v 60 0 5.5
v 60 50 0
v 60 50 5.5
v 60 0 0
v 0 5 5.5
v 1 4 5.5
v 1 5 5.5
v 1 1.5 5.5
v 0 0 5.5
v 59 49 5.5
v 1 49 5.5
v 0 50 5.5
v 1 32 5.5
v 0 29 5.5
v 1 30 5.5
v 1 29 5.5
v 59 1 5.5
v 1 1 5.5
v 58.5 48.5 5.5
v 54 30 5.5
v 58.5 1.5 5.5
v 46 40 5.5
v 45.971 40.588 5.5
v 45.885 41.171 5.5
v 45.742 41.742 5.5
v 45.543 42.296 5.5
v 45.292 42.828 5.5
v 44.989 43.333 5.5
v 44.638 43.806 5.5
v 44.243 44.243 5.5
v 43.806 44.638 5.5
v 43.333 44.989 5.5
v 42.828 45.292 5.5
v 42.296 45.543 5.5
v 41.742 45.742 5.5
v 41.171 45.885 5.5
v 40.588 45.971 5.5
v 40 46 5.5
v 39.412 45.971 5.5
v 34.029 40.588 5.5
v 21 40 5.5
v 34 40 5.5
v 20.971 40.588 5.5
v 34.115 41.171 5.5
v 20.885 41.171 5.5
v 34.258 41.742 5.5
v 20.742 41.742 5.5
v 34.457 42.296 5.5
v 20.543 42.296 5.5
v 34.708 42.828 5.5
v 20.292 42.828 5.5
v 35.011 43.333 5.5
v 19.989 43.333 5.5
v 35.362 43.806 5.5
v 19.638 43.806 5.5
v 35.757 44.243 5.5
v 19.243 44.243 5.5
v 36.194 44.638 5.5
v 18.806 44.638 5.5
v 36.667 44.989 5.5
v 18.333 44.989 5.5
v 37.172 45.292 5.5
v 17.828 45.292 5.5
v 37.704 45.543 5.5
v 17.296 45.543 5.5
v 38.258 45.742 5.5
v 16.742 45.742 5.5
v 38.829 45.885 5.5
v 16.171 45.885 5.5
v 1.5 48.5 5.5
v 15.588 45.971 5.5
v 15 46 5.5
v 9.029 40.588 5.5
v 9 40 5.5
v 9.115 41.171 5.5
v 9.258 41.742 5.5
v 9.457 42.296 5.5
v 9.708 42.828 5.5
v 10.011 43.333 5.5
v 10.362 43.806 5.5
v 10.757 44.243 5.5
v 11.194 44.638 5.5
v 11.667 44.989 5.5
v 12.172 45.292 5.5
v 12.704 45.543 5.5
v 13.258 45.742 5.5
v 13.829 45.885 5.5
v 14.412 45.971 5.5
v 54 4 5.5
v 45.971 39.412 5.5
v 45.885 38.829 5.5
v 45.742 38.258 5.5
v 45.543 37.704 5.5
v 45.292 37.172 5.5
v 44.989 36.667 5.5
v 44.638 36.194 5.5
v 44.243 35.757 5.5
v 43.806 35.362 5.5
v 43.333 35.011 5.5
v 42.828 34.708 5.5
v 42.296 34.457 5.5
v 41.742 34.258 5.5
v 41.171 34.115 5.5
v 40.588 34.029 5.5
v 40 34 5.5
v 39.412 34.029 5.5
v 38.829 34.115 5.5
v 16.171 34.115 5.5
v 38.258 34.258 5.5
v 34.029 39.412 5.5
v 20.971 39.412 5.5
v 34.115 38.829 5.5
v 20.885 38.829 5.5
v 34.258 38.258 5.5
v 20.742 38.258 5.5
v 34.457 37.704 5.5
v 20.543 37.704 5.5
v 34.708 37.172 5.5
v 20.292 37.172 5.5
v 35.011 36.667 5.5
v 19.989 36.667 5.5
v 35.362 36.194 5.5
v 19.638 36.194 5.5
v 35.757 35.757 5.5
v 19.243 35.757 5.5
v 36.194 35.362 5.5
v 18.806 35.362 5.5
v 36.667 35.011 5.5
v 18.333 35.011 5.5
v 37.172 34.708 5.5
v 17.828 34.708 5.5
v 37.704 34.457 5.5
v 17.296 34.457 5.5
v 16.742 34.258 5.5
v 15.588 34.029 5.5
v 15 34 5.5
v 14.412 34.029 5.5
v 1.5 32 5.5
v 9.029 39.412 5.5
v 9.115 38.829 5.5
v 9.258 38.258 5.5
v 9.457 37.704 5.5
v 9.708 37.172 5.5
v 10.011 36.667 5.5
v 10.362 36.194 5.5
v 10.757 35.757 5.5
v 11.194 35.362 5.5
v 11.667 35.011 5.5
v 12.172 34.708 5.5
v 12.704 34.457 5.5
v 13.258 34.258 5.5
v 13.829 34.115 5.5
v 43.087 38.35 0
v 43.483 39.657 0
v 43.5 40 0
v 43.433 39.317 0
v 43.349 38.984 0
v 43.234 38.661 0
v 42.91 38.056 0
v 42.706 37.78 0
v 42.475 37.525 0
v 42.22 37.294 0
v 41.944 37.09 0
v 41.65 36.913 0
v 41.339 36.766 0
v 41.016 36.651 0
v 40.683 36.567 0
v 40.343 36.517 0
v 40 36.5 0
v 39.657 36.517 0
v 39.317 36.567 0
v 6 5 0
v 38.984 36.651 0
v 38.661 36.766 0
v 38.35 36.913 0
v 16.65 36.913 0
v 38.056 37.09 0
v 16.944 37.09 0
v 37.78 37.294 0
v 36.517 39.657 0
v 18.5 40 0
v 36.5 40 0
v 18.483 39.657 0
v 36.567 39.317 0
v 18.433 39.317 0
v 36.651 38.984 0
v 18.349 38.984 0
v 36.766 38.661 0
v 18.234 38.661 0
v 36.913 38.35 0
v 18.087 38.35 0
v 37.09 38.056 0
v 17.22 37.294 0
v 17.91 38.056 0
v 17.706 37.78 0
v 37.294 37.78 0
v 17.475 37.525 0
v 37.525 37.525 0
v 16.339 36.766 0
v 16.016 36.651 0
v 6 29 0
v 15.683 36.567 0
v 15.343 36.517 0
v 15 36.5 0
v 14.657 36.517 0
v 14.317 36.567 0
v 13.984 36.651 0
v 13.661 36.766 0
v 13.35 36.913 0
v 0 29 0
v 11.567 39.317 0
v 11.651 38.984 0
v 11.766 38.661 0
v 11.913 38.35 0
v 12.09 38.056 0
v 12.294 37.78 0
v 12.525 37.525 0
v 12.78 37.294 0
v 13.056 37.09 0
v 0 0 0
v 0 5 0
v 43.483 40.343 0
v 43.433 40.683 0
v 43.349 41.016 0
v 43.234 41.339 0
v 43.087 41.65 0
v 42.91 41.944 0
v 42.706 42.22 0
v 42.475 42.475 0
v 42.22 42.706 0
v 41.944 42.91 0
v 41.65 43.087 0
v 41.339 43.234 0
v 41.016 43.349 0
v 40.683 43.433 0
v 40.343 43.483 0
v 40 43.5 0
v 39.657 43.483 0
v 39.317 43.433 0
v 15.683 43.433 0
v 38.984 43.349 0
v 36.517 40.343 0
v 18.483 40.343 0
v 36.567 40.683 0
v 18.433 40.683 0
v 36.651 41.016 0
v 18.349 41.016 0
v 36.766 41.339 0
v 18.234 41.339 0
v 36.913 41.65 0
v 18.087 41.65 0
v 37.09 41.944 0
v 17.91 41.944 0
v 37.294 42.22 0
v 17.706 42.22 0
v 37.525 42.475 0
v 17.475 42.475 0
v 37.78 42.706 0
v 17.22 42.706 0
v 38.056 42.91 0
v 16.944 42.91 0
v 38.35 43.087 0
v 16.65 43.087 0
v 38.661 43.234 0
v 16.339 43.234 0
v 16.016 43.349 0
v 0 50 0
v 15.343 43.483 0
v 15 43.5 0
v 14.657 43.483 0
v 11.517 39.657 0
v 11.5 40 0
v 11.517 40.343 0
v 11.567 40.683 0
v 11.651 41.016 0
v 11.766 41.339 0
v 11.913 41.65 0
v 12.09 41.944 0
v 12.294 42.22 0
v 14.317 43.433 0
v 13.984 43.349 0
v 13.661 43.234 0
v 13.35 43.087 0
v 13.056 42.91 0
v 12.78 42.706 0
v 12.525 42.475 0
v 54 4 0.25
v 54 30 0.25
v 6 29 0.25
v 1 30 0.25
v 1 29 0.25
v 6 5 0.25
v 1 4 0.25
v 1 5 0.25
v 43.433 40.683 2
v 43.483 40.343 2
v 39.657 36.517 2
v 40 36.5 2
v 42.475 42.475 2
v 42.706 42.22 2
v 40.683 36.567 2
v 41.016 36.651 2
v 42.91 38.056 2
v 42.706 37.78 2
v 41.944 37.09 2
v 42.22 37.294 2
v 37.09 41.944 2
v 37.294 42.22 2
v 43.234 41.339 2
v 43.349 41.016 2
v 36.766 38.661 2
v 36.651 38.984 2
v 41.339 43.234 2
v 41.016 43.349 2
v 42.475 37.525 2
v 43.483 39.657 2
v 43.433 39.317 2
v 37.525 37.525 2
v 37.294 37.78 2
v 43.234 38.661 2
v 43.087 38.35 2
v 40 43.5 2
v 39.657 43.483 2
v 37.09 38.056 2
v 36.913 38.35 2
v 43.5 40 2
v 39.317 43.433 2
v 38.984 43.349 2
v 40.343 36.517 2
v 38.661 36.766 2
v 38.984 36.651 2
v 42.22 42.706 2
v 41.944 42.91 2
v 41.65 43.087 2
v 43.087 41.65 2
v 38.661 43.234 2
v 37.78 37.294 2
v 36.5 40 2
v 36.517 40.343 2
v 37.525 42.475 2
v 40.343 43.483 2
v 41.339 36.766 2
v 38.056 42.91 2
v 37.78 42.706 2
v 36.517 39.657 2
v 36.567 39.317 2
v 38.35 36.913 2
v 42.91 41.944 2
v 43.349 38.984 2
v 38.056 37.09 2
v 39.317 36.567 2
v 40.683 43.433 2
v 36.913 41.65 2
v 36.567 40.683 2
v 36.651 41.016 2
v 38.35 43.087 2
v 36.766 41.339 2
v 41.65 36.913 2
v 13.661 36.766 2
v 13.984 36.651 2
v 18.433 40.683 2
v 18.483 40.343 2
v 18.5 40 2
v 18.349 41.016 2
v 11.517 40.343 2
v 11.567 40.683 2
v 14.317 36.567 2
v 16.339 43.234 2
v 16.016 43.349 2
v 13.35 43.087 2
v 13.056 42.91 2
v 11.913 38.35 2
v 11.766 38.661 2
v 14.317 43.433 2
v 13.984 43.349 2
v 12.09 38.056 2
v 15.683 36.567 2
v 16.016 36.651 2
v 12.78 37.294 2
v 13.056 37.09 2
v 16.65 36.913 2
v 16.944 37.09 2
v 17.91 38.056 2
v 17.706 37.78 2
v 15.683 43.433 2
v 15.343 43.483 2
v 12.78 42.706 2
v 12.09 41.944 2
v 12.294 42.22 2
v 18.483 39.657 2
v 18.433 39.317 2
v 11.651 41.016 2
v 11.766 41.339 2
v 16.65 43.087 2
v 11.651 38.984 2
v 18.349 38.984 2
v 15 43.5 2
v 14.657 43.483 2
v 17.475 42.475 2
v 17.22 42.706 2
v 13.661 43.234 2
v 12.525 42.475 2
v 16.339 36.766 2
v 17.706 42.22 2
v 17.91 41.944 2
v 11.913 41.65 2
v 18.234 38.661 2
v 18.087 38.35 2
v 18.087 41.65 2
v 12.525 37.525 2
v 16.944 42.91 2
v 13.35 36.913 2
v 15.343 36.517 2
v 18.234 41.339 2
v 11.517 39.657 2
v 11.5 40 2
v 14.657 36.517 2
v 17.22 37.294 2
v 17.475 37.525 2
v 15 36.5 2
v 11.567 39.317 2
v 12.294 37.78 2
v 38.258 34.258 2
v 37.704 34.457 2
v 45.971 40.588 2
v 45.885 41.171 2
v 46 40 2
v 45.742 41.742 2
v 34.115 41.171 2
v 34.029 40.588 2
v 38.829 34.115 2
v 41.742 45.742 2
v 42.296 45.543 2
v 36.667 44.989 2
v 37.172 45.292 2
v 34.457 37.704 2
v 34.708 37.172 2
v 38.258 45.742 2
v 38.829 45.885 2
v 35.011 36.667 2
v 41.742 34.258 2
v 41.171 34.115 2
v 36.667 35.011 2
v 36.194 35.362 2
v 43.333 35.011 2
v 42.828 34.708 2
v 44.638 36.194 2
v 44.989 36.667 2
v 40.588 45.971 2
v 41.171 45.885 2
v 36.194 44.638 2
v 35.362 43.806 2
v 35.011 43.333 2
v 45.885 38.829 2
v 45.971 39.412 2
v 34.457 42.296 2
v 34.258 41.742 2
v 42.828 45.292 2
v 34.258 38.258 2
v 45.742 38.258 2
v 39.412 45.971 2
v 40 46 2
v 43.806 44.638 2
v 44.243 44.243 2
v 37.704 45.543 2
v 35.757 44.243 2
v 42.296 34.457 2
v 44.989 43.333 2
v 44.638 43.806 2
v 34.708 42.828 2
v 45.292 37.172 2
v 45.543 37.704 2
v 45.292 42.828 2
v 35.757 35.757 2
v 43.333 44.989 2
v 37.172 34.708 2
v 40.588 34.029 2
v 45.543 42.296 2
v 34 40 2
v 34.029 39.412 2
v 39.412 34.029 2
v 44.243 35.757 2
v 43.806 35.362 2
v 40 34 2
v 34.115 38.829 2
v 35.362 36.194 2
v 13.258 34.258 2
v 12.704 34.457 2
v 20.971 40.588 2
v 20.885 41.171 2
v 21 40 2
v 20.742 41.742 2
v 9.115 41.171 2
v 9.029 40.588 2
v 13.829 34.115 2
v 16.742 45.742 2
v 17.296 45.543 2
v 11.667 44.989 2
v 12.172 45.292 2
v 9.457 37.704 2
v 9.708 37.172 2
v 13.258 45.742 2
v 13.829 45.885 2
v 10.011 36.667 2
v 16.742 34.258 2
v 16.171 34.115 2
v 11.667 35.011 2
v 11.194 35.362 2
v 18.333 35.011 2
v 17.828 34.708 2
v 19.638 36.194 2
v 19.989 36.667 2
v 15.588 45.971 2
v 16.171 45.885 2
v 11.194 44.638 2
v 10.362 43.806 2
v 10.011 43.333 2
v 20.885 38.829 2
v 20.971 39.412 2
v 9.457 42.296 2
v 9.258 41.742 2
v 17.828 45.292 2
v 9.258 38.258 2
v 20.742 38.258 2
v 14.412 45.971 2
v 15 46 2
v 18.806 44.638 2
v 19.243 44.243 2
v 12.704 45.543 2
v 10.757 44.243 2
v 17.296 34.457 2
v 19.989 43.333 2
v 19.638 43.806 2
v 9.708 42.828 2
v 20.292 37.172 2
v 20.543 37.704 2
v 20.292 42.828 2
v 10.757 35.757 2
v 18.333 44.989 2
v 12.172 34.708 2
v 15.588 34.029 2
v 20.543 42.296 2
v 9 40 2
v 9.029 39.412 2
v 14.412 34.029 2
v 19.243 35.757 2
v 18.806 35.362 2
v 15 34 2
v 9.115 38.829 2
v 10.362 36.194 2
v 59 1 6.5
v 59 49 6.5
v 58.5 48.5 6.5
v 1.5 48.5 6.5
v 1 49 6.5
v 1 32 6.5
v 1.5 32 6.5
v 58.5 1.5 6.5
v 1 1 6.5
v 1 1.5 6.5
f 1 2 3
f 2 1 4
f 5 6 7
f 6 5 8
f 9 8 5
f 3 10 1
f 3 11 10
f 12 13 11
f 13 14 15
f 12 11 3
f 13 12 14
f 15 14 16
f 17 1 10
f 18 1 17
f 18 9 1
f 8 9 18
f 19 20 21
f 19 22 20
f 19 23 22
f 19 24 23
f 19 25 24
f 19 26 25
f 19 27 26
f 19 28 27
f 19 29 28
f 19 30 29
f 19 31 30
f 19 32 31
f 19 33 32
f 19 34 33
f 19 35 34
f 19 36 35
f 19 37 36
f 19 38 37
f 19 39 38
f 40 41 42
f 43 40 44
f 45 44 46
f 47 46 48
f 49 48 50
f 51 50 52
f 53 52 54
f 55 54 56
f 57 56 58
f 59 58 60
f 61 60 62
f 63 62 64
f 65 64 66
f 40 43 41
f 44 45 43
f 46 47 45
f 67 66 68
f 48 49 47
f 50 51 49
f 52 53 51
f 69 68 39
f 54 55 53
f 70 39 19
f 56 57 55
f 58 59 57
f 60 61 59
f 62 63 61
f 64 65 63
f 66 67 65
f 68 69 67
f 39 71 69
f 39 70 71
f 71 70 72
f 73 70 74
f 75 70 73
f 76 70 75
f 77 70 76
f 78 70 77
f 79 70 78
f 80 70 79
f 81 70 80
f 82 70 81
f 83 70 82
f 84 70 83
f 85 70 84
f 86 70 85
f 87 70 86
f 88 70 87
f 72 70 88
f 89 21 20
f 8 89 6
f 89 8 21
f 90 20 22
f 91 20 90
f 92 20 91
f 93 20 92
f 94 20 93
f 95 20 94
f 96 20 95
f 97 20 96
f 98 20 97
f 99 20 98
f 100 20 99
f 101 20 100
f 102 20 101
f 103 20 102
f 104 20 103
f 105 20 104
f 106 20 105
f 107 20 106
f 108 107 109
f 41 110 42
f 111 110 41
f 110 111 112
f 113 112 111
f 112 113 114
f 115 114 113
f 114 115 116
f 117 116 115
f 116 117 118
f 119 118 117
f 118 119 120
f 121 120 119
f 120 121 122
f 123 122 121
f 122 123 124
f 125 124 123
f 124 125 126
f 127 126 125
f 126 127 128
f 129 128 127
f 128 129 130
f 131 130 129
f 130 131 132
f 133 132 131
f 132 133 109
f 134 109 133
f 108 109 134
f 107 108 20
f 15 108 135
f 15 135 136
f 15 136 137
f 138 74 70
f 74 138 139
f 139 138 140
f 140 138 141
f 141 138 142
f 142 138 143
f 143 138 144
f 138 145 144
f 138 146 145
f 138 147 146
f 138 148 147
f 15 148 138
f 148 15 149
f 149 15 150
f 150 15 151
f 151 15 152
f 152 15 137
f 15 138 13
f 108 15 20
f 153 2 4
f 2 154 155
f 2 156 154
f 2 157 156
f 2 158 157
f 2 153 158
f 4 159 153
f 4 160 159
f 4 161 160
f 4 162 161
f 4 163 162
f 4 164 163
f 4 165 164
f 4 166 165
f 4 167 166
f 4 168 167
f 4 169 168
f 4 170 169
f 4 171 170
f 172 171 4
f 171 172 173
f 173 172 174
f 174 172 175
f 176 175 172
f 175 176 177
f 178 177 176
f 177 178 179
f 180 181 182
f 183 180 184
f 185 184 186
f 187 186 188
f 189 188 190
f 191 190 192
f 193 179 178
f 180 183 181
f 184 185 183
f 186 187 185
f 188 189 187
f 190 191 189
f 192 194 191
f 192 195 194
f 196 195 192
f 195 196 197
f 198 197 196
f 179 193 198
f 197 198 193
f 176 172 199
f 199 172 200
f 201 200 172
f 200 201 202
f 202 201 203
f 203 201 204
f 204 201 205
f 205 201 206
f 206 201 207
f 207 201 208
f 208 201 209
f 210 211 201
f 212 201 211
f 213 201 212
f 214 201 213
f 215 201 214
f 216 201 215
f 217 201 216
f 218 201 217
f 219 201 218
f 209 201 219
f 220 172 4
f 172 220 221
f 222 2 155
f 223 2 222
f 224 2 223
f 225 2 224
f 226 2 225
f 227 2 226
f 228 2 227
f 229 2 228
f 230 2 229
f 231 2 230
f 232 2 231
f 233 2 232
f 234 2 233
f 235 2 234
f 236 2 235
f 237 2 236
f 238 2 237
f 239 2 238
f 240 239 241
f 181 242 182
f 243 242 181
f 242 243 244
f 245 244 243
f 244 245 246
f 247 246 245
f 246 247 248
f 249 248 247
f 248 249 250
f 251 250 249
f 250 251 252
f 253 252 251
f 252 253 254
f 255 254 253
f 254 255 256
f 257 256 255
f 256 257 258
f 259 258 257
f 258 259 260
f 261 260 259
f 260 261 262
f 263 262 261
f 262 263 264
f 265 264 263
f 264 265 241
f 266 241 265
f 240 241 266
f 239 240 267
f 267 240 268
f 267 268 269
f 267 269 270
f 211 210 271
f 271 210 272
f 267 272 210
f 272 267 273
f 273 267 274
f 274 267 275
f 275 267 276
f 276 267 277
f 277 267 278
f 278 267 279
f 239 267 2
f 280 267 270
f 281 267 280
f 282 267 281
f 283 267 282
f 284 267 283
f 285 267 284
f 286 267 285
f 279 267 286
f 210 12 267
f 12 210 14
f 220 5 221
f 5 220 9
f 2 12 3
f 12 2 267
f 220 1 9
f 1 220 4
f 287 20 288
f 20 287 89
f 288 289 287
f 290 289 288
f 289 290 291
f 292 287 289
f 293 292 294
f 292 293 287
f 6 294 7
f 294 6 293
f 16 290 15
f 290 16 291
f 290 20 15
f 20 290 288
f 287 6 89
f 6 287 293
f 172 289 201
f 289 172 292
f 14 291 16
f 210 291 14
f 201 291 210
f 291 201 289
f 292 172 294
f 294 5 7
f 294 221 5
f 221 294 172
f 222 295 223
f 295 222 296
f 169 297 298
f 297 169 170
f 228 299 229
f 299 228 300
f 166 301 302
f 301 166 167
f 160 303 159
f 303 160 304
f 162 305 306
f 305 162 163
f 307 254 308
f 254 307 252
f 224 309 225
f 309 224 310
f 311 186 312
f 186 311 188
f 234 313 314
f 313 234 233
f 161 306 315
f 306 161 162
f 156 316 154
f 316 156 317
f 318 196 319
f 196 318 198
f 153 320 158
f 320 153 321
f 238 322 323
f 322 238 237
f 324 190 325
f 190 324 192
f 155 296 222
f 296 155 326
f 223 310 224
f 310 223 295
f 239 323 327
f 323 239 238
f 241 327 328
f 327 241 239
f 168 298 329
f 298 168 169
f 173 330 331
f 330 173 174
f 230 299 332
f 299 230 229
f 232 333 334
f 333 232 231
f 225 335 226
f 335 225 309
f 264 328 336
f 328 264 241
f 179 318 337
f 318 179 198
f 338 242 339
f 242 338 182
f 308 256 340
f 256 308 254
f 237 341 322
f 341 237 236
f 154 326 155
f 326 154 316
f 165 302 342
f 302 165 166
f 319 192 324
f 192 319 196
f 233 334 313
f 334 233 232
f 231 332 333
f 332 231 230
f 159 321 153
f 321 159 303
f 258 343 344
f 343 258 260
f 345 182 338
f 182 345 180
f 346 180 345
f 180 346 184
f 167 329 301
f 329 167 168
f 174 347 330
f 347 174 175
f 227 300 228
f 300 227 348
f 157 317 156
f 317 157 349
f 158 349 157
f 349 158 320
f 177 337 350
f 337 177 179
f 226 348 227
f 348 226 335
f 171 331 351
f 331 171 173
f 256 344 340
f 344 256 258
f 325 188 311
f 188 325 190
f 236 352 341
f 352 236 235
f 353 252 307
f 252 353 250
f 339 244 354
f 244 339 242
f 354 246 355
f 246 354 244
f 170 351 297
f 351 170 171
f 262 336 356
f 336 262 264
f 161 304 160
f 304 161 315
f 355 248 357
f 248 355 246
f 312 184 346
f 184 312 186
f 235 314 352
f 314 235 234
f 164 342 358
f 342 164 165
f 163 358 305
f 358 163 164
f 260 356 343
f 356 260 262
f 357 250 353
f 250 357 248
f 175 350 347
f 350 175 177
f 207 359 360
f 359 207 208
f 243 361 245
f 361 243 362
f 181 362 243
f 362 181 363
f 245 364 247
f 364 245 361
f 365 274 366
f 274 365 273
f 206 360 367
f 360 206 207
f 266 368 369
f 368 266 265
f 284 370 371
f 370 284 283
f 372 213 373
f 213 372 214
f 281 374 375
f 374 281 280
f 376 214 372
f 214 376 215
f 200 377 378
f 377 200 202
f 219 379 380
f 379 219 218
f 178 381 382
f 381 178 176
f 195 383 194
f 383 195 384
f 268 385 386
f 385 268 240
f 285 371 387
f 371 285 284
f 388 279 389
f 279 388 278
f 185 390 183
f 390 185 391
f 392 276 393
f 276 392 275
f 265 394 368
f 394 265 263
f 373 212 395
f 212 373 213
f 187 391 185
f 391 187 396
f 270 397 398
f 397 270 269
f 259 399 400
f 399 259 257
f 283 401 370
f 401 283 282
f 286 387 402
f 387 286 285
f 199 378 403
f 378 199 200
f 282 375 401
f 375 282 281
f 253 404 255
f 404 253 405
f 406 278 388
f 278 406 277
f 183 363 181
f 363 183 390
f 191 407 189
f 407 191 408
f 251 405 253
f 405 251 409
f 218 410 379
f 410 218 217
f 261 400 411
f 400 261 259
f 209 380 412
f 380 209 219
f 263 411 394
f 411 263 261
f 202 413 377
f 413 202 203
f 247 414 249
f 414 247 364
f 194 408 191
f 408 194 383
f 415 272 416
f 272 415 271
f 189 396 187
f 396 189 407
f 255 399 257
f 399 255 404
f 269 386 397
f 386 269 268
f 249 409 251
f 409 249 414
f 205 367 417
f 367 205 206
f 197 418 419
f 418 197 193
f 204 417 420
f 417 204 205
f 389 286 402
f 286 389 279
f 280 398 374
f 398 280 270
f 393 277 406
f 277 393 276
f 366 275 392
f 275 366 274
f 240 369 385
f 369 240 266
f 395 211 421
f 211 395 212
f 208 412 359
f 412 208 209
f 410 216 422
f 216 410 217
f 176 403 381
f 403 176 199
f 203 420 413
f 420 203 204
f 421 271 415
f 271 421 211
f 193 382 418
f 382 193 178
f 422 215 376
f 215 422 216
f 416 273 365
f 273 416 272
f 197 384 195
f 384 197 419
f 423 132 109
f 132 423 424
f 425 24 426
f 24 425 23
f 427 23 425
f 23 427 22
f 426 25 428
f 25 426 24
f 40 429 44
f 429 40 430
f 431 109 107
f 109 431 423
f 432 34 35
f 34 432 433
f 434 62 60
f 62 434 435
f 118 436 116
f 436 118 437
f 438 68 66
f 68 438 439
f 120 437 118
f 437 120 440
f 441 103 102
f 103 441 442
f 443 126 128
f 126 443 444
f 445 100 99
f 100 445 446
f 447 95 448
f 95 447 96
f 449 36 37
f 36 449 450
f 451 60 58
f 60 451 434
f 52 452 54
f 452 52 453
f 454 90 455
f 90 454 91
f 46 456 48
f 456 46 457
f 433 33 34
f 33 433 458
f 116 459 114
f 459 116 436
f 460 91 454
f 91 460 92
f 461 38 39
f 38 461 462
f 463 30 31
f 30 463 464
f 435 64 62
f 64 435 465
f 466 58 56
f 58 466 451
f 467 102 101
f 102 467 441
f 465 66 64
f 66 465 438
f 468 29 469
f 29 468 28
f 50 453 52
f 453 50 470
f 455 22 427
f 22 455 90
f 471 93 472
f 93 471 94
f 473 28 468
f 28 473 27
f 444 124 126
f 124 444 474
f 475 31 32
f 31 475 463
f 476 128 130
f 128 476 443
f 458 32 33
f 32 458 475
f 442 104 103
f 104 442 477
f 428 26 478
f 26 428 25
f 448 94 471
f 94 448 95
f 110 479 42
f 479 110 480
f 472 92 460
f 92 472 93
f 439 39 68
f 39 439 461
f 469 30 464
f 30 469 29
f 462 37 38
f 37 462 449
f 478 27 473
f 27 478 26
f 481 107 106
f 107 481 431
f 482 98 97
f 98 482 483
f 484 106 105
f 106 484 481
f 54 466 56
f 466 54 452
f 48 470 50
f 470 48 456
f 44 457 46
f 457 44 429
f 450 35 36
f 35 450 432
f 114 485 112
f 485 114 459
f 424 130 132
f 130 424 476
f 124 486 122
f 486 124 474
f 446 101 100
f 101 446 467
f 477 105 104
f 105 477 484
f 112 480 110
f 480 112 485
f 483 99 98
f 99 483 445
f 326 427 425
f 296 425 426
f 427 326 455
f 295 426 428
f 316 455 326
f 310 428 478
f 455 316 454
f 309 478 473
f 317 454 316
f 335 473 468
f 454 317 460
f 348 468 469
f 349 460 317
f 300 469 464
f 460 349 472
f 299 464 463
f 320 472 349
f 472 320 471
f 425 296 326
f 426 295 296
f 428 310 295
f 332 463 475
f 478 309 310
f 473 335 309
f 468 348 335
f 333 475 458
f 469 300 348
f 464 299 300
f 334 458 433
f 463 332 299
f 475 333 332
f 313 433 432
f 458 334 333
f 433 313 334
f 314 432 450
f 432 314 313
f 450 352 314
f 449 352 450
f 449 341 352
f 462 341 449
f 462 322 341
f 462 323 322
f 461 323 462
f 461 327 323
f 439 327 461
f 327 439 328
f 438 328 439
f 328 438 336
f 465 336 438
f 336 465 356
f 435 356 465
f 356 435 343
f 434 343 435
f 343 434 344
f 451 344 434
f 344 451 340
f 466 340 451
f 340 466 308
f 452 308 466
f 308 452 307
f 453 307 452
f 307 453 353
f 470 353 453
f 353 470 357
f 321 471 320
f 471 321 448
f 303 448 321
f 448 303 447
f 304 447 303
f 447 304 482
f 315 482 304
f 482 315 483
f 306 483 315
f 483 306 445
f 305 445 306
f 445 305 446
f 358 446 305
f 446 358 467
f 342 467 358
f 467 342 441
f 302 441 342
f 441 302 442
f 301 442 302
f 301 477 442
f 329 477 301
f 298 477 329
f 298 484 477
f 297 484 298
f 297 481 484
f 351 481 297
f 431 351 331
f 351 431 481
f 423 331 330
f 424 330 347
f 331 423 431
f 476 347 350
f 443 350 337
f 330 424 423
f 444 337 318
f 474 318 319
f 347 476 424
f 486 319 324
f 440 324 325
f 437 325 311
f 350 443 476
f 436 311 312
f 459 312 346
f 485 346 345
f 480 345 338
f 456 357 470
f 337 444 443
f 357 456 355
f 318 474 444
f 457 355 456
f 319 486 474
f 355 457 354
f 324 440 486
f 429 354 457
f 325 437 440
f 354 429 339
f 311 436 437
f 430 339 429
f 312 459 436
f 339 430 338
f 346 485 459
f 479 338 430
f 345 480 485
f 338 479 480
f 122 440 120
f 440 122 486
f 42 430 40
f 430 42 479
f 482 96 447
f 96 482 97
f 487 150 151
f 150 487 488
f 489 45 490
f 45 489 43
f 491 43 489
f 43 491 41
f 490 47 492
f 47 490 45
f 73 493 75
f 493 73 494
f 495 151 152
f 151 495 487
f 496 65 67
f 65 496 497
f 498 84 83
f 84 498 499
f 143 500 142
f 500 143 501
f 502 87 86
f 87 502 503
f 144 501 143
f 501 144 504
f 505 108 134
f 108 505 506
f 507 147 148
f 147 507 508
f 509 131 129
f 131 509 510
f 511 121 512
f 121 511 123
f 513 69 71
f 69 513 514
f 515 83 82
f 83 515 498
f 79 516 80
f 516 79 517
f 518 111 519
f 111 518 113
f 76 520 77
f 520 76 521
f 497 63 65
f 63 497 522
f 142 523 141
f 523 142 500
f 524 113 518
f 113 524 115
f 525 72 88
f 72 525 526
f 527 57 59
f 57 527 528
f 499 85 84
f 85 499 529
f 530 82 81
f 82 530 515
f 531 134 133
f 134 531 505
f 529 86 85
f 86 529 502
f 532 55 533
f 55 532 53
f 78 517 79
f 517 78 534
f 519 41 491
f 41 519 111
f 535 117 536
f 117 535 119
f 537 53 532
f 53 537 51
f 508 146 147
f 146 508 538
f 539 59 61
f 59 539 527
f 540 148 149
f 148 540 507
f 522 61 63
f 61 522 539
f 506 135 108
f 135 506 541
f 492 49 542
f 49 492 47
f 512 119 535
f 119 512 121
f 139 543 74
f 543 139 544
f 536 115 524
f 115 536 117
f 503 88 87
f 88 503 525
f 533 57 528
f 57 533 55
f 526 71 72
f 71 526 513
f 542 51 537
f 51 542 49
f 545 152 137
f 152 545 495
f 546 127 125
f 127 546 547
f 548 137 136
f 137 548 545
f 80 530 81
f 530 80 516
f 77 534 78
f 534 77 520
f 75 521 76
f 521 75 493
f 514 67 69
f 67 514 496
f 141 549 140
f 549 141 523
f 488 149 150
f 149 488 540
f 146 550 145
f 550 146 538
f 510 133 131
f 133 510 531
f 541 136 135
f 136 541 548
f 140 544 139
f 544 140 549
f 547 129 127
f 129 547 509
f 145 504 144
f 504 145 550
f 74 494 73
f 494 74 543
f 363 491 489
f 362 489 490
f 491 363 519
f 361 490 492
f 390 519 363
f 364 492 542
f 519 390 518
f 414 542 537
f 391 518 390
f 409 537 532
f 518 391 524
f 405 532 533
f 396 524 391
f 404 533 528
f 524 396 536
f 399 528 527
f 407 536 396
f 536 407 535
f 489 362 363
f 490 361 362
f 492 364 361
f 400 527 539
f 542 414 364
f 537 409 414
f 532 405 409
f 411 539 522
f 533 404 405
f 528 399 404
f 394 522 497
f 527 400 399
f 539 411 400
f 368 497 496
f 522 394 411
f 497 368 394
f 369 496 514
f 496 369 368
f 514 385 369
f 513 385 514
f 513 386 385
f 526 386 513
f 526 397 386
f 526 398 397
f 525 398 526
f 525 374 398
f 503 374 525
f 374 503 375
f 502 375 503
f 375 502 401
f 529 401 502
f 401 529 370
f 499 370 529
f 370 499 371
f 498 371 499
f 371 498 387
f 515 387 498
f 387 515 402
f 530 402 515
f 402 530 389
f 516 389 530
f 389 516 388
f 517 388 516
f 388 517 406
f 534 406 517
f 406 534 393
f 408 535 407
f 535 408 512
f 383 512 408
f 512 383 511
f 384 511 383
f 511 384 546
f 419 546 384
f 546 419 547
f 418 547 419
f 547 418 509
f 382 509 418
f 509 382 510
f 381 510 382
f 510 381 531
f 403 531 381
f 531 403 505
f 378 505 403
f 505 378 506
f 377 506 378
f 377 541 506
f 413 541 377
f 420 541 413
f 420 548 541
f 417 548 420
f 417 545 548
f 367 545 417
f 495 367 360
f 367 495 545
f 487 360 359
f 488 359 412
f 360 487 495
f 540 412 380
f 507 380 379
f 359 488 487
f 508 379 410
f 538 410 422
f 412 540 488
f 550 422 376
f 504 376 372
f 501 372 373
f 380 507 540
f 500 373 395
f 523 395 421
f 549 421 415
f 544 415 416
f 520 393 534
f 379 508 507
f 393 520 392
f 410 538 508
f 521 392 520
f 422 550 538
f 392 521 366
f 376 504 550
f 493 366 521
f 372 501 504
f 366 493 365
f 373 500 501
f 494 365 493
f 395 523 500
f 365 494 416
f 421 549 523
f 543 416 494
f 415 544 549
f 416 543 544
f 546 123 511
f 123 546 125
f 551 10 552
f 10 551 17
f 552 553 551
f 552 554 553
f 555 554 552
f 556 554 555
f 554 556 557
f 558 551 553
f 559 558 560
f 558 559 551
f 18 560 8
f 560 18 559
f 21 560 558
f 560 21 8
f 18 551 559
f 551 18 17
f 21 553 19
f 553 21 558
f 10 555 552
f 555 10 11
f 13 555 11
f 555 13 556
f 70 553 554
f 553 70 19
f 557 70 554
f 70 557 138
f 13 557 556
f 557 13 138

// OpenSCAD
$fn = 64;
union() {
	difference() {
		cube([60, 50, 5.5]);
		translate([1, 4, 0.25]) cube([53, 26, 6]);
		translate([-1, 5, -1]) cube([7, 24, 7]);
		translate([40, 40, 0]) cylinder(10, 3.5, 3.5, true);
		translate([15, 40, 0]) cylinder(10, 3.5, 3.5, true);
		translate([40, 40, 2]) cylinder(10, 6, 6);
		translate([15, 40, 2]) cylinder(10, 6, 6);
	}
	translate([1, 1, 5.5]) cube([58, 0.5, 1]);
	translate([58.5, 1, 5.5]) cube([0.5, 48, 1]);
	translate([1, 48.5, 5.5]) cube([58, 0.5, 1]);
	translate([1, 32, 5.5]) cube([0.5, 17, 1]);
}
